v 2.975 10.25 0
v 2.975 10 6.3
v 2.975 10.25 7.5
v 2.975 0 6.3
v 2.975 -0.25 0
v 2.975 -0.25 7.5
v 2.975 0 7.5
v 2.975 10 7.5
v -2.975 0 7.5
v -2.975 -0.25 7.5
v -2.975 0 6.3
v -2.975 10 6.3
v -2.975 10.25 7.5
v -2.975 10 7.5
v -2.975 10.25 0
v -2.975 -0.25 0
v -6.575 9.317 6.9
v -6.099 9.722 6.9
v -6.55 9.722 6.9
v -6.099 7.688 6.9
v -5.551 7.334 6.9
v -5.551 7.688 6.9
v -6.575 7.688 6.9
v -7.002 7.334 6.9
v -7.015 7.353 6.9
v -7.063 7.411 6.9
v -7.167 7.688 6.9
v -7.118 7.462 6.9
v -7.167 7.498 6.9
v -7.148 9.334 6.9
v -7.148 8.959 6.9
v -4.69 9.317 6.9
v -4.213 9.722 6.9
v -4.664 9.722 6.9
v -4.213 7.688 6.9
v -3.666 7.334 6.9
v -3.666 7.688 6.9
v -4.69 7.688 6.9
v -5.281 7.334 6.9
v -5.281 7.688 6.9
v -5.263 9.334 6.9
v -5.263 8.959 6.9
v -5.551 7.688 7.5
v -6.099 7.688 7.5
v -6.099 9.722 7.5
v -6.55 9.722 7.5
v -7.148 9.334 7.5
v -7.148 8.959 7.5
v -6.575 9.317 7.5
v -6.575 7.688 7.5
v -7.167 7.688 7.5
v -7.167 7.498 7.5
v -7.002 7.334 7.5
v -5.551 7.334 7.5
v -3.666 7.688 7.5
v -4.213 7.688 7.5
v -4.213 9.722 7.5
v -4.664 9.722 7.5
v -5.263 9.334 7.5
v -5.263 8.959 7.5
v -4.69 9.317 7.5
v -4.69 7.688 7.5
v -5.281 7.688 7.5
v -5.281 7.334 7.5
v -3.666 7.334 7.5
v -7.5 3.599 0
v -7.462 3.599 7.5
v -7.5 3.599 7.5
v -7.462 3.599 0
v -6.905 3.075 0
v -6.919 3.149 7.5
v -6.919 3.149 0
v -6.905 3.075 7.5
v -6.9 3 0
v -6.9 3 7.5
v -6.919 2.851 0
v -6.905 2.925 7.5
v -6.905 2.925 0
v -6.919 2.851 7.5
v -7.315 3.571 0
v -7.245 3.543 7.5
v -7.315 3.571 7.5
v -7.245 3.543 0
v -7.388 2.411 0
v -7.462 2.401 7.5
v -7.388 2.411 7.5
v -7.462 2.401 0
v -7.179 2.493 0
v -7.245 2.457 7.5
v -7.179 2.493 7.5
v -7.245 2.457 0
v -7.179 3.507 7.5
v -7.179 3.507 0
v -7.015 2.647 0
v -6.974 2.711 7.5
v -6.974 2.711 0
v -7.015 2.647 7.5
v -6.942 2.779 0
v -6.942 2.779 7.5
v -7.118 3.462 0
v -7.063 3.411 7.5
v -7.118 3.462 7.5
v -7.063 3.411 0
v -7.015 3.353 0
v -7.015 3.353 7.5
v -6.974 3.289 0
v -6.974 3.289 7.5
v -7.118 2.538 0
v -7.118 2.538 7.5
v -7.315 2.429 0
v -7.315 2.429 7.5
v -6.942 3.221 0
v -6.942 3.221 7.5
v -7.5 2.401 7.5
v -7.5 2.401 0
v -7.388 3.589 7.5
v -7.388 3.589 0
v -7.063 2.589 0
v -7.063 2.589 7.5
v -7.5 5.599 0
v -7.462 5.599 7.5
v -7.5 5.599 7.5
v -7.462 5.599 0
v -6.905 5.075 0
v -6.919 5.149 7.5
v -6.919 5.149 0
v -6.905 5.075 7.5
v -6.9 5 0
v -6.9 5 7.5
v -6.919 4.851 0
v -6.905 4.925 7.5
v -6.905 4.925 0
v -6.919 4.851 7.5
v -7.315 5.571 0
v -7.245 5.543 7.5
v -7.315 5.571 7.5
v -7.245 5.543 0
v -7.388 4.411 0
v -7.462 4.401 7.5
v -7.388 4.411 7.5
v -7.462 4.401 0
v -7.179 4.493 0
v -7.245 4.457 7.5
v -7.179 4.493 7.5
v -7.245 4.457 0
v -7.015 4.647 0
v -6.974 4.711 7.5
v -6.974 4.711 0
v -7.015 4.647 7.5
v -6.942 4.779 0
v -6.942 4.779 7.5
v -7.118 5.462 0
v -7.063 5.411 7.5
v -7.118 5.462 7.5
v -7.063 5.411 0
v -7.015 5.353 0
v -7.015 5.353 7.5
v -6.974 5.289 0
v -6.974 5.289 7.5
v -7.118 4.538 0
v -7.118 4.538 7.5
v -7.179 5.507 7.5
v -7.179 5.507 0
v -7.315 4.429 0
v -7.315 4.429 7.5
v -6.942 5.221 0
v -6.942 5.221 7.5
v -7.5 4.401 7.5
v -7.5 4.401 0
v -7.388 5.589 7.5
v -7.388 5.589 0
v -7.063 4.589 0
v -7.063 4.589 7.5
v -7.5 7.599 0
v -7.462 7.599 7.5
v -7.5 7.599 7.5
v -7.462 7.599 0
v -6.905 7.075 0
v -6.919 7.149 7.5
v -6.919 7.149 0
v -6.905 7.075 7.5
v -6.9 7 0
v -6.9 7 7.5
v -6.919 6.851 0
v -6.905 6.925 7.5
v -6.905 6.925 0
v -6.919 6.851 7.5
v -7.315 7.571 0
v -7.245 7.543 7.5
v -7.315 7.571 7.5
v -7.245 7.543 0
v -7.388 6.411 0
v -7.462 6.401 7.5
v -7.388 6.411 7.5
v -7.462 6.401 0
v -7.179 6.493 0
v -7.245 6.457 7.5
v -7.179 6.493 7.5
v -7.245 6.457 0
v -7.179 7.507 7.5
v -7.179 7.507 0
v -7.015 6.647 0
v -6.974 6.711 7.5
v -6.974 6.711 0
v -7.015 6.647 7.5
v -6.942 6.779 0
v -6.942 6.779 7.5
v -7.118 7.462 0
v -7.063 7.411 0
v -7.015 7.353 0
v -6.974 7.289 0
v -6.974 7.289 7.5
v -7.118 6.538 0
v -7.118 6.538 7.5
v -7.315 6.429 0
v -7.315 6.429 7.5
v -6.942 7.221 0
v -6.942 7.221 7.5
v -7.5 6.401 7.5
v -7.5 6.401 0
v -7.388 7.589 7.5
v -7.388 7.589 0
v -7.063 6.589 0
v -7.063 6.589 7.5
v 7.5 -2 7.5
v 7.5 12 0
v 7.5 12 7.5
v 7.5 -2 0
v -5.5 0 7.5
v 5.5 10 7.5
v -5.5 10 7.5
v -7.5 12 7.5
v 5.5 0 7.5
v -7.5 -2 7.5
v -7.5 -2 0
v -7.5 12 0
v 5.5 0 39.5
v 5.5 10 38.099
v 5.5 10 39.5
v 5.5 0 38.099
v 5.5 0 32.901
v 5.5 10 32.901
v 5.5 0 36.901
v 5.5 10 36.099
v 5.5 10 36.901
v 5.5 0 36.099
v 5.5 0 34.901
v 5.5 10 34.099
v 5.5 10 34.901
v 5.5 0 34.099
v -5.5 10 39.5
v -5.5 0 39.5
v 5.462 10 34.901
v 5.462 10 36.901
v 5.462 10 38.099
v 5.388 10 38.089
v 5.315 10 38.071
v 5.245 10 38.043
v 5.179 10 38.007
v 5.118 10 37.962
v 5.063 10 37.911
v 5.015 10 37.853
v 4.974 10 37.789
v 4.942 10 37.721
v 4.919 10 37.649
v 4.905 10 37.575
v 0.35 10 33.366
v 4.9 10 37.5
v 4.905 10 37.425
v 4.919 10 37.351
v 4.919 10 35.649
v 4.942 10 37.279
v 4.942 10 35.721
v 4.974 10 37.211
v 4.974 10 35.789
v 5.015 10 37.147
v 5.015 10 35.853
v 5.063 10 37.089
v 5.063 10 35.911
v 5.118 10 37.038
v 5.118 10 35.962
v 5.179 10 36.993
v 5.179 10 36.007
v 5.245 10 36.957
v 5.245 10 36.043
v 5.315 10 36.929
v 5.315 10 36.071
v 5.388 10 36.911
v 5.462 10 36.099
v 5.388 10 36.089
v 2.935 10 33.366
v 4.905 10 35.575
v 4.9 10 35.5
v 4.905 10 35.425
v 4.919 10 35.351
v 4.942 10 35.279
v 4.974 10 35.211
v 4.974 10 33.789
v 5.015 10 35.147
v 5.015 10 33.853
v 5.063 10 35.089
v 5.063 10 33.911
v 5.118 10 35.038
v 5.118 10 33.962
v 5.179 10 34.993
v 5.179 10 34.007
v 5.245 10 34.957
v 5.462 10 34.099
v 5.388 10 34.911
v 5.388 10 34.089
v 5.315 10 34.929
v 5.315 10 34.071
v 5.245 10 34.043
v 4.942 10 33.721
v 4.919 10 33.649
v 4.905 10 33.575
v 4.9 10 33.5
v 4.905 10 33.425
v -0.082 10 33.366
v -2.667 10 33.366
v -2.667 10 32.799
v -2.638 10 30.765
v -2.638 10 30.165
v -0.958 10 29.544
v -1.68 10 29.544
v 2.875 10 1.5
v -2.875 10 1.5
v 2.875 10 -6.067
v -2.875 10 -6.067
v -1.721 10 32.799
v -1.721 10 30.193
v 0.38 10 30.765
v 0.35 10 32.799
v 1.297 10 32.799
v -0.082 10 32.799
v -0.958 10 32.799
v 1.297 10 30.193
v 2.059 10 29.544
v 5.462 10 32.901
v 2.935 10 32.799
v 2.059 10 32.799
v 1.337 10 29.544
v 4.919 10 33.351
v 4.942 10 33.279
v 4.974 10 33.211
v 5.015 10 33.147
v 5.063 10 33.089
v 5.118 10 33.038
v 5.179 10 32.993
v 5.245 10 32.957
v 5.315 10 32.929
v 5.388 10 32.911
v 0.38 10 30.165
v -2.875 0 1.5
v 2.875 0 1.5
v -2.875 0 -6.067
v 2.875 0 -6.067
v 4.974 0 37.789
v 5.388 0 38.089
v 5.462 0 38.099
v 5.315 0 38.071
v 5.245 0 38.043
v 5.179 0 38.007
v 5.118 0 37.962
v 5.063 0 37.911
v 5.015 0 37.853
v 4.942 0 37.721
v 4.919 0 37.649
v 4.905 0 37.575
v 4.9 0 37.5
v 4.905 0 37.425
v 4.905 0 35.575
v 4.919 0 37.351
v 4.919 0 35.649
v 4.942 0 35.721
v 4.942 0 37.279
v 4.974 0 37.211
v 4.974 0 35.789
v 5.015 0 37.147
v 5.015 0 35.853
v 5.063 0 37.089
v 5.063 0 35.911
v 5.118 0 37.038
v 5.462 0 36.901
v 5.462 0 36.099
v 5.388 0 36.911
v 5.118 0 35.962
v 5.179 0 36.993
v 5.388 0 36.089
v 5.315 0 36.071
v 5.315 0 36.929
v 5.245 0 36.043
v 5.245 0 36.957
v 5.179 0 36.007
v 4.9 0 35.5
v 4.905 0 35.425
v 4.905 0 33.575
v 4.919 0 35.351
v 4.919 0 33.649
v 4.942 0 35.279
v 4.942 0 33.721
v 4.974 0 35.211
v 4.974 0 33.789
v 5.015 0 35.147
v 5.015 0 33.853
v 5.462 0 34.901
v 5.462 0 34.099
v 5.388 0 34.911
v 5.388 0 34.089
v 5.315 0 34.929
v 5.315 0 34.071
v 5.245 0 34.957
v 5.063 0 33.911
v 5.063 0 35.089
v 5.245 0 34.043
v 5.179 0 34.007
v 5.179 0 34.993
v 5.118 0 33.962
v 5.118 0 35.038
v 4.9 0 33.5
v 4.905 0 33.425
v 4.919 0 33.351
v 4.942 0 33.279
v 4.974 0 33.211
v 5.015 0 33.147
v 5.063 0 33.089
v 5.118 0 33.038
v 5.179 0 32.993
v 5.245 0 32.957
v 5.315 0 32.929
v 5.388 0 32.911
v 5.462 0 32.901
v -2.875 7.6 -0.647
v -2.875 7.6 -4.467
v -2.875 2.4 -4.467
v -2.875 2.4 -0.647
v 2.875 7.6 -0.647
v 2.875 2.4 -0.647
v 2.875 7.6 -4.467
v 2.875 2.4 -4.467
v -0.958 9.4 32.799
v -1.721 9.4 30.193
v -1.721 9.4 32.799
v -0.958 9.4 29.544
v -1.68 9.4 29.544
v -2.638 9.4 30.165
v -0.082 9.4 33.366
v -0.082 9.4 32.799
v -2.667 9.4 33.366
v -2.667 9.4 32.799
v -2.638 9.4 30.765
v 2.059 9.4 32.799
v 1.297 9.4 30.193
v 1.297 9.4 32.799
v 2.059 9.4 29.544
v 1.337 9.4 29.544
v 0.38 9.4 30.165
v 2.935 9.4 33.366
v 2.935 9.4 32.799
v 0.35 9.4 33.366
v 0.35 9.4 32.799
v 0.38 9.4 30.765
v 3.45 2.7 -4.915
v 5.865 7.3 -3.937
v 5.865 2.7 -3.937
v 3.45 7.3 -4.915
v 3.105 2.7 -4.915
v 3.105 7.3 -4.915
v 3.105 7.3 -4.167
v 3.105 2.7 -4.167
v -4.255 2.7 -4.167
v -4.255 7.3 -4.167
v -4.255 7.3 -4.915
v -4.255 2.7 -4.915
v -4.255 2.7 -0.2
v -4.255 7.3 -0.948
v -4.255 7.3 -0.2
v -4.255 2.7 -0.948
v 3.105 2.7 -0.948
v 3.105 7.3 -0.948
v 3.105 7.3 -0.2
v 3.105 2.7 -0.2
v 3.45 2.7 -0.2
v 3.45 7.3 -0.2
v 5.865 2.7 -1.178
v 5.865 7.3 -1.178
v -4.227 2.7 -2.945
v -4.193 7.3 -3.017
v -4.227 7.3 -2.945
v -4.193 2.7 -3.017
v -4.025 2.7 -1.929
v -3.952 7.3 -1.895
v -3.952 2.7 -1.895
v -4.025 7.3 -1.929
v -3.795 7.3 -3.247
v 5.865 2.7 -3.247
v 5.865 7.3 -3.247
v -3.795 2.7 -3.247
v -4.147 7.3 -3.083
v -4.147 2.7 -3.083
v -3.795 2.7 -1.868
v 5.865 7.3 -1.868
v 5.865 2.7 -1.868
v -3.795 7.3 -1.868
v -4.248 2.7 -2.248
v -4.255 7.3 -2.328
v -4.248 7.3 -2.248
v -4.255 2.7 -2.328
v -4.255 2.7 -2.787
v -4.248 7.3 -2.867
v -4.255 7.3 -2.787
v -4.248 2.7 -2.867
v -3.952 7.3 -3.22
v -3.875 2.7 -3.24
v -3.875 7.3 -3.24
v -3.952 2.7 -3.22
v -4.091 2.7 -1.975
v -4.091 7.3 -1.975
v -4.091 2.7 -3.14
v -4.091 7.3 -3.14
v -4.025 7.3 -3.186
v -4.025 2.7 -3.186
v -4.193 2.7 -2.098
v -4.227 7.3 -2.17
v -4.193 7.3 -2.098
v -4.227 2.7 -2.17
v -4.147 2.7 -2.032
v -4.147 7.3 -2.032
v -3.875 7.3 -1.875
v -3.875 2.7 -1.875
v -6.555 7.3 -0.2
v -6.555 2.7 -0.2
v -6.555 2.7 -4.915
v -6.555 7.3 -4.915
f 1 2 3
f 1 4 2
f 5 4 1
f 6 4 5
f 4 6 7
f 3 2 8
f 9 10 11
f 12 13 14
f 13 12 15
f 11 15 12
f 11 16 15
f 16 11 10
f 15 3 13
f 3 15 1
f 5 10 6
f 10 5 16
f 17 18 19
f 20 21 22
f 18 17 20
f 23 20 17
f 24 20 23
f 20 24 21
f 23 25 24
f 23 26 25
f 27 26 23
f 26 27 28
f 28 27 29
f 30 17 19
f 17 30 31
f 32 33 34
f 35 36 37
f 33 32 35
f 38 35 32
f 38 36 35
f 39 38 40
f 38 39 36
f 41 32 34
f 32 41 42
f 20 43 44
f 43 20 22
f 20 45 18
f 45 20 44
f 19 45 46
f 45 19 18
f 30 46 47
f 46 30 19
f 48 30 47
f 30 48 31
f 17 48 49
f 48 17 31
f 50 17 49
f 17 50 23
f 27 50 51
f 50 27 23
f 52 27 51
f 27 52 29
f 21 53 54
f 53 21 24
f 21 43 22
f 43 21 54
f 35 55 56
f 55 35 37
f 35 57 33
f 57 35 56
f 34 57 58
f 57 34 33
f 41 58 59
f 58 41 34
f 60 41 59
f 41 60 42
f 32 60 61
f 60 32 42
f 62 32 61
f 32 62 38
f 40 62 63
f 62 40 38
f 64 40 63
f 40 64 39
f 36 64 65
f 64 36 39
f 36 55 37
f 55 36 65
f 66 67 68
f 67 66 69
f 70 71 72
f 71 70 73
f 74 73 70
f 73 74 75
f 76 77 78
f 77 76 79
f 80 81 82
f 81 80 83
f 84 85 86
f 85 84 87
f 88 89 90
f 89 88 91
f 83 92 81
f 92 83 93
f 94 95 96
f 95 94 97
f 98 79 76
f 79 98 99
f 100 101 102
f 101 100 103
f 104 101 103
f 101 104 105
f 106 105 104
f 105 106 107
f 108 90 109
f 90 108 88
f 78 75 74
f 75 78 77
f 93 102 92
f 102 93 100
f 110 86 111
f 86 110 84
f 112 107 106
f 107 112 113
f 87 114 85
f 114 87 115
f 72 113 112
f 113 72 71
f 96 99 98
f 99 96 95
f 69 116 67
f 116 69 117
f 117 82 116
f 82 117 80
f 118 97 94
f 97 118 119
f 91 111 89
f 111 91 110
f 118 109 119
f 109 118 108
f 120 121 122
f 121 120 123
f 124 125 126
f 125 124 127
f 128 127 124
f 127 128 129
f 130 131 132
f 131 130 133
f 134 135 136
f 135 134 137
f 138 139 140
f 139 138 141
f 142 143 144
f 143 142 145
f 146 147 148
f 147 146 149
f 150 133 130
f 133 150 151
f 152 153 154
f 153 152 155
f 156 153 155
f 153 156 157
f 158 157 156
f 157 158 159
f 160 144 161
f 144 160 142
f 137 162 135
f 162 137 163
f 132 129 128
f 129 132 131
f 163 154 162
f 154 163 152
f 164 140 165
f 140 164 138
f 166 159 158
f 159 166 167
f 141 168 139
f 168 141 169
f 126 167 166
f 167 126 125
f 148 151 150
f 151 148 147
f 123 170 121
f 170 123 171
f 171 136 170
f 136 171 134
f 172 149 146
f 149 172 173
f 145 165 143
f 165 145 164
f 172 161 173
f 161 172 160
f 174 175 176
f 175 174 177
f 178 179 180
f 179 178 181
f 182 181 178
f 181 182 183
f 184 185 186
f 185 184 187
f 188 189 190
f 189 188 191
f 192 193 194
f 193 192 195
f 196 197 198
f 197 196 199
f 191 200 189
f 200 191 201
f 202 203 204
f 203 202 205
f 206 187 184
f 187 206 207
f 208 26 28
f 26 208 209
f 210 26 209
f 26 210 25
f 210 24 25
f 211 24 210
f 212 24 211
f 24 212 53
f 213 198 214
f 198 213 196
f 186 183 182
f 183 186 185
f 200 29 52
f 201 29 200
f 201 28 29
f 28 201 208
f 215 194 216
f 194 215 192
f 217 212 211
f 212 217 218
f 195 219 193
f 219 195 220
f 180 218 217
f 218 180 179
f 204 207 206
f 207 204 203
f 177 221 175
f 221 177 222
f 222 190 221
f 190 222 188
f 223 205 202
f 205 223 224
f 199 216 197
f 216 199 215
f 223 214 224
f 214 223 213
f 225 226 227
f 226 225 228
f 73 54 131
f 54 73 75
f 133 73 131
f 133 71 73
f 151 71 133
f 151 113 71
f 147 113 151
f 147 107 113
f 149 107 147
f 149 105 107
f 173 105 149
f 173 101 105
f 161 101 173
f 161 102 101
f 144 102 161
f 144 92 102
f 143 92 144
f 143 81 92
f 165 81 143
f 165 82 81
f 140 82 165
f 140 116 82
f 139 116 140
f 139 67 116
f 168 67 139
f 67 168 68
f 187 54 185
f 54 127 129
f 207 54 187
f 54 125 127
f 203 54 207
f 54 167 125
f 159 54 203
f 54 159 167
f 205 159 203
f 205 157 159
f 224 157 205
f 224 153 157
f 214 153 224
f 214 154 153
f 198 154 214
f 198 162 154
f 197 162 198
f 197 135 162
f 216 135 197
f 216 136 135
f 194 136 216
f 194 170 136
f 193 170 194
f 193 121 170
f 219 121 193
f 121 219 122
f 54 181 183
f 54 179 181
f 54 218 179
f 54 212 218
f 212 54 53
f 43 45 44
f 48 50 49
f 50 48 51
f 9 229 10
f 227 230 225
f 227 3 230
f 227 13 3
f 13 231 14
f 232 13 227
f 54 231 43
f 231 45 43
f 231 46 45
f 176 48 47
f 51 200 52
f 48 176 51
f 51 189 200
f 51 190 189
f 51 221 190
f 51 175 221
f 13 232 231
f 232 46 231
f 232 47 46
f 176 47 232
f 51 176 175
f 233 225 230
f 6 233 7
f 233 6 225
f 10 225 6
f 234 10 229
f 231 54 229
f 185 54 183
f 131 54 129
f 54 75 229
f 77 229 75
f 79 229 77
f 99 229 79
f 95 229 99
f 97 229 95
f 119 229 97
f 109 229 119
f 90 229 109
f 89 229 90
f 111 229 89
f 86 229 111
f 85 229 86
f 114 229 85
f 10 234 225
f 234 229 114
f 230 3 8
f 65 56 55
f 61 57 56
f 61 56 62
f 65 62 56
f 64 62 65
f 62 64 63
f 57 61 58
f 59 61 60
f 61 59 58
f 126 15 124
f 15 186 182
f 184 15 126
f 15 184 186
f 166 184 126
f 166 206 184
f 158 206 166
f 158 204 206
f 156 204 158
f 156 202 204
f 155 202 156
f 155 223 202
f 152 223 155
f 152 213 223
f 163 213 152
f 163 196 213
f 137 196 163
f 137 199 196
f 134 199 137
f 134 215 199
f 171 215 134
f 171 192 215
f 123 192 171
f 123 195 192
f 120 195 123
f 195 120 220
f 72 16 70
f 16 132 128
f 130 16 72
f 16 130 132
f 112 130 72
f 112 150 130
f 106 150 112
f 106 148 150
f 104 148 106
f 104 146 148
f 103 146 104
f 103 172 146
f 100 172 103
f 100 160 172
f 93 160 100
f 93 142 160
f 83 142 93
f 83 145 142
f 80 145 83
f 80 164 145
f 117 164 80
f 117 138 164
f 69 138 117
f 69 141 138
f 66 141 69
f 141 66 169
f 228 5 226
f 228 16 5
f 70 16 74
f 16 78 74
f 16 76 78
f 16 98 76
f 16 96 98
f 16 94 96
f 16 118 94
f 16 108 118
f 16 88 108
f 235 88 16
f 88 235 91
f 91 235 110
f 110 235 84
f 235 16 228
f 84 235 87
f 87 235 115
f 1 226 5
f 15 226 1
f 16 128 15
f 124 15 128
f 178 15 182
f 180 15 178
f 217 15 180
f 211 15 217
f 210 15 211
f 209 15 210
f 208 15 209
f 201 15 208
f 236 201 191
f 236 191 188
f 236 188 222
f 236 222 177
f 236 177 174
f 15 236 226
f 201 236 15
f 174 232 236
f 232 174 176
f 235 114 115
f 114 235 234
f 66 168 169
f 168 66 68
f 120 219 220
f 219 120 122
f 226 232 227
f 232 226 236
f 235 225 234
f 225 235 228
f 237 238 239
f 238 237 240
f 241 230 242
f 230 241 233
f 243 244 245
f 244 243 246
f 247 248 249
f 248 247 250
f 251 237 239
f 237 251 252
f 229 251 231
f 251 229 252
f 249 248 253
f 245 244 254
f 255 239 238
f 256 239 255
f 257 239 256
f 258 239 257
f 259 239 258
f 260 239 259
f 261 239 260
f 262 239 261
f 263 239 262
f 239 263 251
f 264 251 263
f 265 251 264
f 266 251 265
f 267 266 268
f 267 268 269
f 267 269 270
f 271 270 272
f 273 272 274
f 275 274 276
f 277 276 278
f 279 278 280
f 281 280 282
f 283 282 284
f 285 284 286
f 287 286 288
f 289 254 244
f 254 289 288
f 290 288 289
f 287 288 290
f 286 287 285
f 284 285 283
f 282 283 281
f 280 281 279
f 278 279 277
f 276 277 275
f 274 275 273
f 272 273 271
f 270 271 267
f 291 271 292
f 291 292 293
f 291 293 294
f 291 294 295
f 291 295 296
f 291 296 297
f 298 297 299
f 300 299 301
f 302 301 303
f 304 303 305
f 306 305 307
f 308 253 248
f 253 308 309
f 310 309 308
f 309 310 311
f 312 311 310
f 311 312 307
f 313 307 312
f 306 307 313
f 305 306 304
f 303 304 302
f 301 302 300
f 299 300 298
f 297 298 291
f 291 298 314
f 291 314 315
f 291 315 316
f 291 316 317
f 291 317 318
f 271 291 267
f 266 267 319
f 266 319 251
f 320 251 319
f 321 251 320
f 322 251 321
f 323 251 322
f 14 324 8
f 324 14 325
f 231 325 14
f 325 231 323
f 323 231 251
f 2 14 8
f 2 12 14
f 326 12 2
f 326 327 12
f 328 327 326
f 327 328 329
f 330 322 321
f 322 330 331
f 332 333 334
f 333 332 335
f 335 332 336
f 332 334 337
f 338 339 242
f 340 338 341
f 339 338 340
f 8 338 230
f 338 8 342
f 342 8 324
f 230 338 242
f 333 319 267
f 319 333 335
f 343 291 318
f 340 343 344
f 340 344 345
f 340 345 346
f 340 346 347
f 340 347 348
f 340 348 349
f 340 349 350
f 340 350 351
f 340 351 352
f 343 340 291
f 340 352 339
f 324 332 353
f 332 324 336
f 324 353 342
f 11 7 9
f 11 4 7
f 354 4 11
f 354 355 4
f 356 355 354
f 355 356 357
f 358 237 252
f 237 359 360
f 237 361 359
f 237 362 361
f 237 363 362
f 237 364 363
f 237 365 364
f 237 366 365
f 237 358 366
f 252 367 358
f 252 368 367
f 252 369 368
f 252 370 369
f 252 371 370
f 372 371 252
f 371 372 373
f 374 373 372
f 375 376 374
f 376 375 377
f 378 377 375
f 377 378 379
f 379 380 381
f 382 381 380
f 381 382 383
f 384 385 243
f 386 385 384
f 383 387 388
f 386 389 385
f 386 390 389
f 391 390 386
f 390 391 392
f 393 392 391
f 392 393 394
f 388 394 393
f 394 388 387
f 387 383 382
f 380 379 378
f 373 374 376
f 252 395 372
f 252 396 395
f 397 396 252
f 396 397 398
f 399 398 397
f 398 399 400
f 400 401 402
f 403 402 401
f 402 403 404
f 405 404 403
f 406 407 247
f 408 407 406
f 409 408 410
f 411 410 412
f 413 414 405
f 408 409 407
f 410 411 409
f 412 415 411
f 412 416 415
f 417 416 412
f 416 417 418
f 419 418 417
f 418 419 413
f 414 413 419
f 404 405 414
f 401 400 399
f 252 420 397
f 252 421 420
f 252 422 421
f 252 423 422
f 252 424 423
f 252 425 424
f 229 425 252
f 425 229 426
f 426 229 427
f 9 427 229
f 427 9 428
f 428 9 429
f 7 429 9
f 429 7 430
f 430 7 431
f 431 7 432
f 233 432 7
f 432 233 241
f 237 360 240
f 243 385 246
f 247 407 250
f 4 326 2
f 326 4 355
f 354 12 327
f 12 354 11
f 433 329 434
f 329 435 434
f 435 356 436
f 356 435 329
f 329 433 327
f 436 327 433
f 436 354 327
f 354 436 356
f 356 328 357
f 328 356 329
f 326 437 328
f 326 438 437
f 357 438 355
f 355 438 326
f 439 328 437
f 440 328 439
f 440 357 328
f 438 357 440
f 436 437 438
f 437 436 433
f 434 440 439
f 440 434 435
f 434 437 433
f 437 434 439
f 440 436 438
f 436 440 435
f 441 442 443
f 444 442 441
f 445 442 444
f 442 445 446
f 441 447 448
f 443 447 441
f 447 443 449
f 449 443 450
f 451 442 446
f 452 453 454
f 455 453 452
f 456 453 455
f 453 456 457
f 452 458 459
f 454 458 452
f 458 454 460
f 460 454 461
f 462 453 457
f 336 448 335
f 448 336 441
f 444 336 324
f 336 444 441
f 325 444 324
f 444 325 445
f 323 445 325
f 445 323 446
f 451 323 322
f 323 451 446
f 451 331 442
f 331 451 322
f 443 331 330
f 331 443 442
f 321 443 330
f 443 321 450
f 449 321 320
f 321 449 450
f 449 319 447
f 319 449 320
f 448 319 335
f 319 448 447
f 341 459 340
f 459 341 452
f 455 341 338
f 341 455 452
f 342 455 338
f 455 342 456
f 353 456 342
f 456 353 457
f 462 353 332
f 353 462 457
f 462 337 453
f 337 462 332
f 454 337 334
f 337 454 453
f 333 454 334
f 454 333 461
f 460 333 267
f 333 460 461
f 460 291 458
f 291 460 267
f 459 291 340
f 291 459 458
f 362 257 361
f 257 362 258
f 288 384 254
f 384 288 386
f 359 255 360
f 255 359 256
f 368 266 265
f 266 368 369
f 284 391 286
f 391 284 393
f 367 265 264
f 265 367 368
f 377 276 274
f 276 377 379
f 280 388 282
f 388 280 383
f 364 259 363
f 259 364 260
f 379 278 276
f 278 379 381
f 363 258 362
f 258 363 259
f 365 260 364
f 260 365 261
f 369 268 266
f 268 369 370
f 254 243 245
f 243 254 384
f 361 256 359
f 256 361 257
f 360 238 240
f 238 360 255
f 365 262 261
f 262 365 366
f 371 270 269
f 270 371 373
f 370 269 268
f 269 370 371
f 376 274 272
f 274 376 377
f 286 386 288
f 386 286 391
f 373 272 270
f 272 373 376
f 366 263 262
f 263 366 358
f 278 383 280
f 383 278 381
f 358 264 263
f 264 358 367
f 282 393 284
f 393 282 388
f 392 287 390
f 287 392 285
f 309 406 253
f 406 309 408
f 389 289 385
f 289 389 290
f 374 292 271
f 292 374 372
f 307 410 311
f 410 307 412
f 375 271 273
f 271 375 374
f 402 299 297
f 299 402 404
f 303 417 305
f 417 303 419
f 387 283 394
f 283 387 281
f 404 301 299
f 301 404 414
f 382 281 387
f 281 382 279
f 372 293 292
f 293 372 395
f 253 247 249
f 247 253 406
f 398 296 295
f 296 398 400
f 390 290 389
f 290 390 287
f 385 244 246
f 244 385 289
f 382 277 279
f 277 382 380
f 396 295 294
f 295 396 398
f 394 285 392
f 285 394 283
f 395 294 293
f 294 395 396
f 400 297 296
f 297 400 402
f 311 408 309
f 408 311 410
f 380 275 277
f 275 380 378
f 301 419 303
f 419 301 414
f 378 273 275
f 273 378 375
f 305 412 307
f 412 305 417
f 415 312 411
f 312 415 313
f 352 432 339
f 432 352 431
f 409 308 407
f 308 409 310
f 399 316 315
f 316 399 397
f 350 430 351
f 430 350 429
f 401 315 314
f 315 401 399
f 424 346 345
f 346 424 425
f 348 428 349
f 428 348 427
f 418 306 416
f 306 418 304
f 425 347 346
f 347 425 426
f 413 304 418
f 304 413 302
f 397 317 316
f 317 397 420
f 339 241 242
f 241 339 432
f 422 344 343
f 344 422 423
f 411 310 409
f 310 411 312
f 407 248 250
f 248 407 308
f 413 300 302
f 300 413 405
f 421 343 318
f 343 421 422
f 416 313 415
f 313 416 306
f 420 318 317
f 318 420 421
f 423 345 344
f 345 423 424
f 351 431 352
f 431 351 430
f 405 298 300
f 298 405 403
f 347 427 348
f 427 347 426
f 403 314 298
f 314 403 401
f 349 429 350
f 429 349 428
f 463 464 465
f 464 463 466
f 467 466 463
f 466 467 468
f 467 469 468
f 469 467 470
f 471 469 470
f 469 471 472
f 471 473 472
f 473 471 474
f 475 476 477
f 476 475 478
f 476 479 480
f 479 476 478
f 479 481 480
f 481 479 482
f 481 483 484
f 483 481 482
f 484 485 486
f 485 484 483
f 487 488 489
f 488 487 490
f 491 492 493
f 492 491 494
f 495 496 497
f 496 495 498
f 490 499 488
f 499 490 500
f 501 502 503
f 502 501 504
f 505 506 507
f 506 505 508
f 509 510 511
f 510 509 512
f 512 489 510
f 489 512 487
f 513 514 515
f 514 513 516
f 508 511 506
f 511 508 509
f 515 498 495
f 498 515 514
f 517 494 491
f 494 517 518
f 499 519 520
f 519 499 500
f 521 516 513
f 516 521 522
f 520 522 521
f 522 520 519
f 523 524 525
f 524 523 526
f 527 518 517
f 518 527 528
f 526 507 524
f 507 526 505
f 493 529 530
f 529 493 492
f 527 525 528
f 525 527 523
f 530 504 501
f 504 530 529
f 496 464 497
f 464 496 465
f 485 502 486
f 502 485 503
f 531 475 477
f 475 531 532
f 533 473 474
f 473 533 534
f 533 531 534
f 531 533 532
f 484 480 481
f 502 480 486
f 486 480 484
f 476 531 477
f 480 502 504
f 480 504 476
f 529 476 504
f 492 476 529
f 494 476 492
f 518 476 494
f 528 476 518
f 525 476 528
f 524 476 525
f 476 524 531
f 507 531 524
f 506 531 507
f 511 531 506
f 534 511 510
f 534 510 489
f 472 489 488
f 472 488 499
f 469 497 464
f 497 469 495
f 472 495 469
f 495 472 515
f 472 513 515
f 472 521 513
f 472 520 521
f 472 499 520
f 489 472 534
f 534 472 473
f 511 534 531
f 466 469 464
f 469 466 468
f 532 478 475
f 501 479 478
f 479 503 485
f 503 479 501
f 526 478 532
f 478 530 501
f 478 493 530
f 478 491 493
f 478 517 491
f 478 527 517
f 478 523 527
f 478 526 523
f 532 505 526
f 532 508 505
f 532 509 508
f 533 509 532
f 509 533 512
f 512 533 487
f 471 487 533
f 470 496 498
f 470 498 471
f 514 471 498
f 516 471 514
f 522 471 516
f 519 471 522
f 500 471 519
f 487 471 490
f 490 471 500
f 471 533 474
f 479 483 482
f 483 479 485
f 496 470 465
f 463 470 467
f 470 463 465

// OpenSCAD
$fn = 50;

difference() {
	union() {
		translate(v = [0, 0, 0]) {
			rotate(a = [0, 0, 0]) {
				difference() {
					union() {
						translate(v = [-7.5, -2.0, 0]) {
							cube(size = [15.0, 14.0, 7.5]);
						}
					}
					union() {
						translate(v = [-2.975, -0.25, -0.1]) {
							cube(size = [5.95, 10.5, 7.7]);
						}
						translate(v = [-5.5, 8.5, 6.9]) {
							linear_extrude(height = 0.7) {
								text(font = "Arial:style=Bold", halign = "center", size = 2.5, text = "11", valign = "center");
							}
						}
						translate(v = [-7.5, 3, -0.1]) {
							cylinder(h = 7.7, r = 0.6);
						}
						translate(v = [-7.5, 5, -0.1]) {
							cylinder(h = 7.7, r = 0.6);
						}
						translate(v = [-7.5, 7, -0.1]) {
							cylinder(h = 7.7, r = 0.6);
						}
					}
				}
			}
		}
		translate(v = [0, 0, 7.5]) {
			rotate(a = [0, 0, 0]) {
				difference() {
					union() {
						translate(v = [-5.5, 0, 0]) {
							cube(size = [11.0, 10.0, 32.0]);
						}
						translate(v = [0, 10.0, 0]) {
							rotate(a = [90, 0, 0]) {
								linear_extrude(height = 10.0) {
									polygon(points = [[-2.875, -13.5675], [2.875, -13.5675], [2.875, -6.0], [3.0, 0], [3.0, 0.1], [-3.0, 0.1], [-3.0, 0], [-2.875, -6.0]]);
								}
							}
						}
					}
					union() {
						translate(v = [-2.975, 2.4000000000000004, -11.9675]) {
							cube(size = [5.95, 5.199999999999999, 3.8200000000000003]);
						}
						translate(v = [0, 9.4, 24.0]) {
							rotate(a = [-90, 0, 0]) {
								linear_extrude(height = 0.7) {
									text(font = "Arial:style=Bold", halign = "center", size = 4.0, text = "11", valign = "center");
								}
							}
						}
						translate(v = [5.5, 10.1, 30.0]) {
							rotate(a = [90, 0, 0]) {
								cylinder(h = 10.2, r = 0.6);
							}
						}
						translate(v = [5.5, 10.1, 28.0]) {
							rotate(a = [90, 0, 0]) {
								cylinder(h = 10.2, r = 0.6);
							}
						}
						translate(v = [5.5, 10.1, 26.0]) {
							rotate(a = [90, 0, 0]) {
								cylinder(h = 10.2, r = 0.6);
							}
						}
					}
				}
			}
		}
		translate(v = [0, 2.7, -2.557499999999999]) {
			rotate(a = [0, 0, 0]) {
				difference() {
					union() {
						translate(v = [-6.555, 0, -2.3575]) {
							cube(size = [12.42, 4.6, 4.715]);
						}
					}
					union() {
						translate(v = [0, 4.699999999999999, 0]) {
							rotate(a = [90, 0, 0]) {
								linear_extrude(height = 4.8) {
									polygon(points = [[-4.255, -1.61], [3.105, -1.61], [3.105, -2.3575], [3.45, -2.3575], [5.865, -1.38], [5.965, -1.38], [5.965, -2.4575], [-4.255, -2.4575]]);
								}
							}
						}
						translate(v = [0, 4.699999999999999, 0]) {
							rotate(a = [90, 0, 0]) {
								linear_extrude(height = 4.8) {
									polygon(points = [[-4.255, 1.61], [3.105, 1.61], [3.105, 2.3575], [3.45, 2.3575], [5.865, 1.38], [5.965, 1.38], [5.965, 2.4575], [-4.255, 2.4575]]);
								}
							}
						}
						translate(v = [0, 4.699999999999999, 0]) {
							rotate(a = [90, 0, 0]) {
								linear_extrude(height = 4.8) {
									polygon(points = [[-4.255, 0.23], [-4.248012, 0.309878], [-4.227259, 0.387329], [-4.193372, 0.46], [-4.14738, 0.525682], [-4.090682, 0.58238], [-4.025, 0.628372], [-3.952329, 0.662259], [-3.874878, 0.683012], [-3.795, 0.69], [5.965, 0.69], [5.965, -0.69], [-3.795, -0.69], [-3.874878, -0.683012], [-3.952329, -0.662259], [-4.025, -0.628372], [-4.090682, -0.58238], [-4.14738, -0.525682], [-4.193372, -0.46], [-4.227259, -0.387329], [-4.248012, -0.309878], [-4.255, -0.23]]);
								}
							}
						}
					}
				}
			}
		}
	}
	union();
}
